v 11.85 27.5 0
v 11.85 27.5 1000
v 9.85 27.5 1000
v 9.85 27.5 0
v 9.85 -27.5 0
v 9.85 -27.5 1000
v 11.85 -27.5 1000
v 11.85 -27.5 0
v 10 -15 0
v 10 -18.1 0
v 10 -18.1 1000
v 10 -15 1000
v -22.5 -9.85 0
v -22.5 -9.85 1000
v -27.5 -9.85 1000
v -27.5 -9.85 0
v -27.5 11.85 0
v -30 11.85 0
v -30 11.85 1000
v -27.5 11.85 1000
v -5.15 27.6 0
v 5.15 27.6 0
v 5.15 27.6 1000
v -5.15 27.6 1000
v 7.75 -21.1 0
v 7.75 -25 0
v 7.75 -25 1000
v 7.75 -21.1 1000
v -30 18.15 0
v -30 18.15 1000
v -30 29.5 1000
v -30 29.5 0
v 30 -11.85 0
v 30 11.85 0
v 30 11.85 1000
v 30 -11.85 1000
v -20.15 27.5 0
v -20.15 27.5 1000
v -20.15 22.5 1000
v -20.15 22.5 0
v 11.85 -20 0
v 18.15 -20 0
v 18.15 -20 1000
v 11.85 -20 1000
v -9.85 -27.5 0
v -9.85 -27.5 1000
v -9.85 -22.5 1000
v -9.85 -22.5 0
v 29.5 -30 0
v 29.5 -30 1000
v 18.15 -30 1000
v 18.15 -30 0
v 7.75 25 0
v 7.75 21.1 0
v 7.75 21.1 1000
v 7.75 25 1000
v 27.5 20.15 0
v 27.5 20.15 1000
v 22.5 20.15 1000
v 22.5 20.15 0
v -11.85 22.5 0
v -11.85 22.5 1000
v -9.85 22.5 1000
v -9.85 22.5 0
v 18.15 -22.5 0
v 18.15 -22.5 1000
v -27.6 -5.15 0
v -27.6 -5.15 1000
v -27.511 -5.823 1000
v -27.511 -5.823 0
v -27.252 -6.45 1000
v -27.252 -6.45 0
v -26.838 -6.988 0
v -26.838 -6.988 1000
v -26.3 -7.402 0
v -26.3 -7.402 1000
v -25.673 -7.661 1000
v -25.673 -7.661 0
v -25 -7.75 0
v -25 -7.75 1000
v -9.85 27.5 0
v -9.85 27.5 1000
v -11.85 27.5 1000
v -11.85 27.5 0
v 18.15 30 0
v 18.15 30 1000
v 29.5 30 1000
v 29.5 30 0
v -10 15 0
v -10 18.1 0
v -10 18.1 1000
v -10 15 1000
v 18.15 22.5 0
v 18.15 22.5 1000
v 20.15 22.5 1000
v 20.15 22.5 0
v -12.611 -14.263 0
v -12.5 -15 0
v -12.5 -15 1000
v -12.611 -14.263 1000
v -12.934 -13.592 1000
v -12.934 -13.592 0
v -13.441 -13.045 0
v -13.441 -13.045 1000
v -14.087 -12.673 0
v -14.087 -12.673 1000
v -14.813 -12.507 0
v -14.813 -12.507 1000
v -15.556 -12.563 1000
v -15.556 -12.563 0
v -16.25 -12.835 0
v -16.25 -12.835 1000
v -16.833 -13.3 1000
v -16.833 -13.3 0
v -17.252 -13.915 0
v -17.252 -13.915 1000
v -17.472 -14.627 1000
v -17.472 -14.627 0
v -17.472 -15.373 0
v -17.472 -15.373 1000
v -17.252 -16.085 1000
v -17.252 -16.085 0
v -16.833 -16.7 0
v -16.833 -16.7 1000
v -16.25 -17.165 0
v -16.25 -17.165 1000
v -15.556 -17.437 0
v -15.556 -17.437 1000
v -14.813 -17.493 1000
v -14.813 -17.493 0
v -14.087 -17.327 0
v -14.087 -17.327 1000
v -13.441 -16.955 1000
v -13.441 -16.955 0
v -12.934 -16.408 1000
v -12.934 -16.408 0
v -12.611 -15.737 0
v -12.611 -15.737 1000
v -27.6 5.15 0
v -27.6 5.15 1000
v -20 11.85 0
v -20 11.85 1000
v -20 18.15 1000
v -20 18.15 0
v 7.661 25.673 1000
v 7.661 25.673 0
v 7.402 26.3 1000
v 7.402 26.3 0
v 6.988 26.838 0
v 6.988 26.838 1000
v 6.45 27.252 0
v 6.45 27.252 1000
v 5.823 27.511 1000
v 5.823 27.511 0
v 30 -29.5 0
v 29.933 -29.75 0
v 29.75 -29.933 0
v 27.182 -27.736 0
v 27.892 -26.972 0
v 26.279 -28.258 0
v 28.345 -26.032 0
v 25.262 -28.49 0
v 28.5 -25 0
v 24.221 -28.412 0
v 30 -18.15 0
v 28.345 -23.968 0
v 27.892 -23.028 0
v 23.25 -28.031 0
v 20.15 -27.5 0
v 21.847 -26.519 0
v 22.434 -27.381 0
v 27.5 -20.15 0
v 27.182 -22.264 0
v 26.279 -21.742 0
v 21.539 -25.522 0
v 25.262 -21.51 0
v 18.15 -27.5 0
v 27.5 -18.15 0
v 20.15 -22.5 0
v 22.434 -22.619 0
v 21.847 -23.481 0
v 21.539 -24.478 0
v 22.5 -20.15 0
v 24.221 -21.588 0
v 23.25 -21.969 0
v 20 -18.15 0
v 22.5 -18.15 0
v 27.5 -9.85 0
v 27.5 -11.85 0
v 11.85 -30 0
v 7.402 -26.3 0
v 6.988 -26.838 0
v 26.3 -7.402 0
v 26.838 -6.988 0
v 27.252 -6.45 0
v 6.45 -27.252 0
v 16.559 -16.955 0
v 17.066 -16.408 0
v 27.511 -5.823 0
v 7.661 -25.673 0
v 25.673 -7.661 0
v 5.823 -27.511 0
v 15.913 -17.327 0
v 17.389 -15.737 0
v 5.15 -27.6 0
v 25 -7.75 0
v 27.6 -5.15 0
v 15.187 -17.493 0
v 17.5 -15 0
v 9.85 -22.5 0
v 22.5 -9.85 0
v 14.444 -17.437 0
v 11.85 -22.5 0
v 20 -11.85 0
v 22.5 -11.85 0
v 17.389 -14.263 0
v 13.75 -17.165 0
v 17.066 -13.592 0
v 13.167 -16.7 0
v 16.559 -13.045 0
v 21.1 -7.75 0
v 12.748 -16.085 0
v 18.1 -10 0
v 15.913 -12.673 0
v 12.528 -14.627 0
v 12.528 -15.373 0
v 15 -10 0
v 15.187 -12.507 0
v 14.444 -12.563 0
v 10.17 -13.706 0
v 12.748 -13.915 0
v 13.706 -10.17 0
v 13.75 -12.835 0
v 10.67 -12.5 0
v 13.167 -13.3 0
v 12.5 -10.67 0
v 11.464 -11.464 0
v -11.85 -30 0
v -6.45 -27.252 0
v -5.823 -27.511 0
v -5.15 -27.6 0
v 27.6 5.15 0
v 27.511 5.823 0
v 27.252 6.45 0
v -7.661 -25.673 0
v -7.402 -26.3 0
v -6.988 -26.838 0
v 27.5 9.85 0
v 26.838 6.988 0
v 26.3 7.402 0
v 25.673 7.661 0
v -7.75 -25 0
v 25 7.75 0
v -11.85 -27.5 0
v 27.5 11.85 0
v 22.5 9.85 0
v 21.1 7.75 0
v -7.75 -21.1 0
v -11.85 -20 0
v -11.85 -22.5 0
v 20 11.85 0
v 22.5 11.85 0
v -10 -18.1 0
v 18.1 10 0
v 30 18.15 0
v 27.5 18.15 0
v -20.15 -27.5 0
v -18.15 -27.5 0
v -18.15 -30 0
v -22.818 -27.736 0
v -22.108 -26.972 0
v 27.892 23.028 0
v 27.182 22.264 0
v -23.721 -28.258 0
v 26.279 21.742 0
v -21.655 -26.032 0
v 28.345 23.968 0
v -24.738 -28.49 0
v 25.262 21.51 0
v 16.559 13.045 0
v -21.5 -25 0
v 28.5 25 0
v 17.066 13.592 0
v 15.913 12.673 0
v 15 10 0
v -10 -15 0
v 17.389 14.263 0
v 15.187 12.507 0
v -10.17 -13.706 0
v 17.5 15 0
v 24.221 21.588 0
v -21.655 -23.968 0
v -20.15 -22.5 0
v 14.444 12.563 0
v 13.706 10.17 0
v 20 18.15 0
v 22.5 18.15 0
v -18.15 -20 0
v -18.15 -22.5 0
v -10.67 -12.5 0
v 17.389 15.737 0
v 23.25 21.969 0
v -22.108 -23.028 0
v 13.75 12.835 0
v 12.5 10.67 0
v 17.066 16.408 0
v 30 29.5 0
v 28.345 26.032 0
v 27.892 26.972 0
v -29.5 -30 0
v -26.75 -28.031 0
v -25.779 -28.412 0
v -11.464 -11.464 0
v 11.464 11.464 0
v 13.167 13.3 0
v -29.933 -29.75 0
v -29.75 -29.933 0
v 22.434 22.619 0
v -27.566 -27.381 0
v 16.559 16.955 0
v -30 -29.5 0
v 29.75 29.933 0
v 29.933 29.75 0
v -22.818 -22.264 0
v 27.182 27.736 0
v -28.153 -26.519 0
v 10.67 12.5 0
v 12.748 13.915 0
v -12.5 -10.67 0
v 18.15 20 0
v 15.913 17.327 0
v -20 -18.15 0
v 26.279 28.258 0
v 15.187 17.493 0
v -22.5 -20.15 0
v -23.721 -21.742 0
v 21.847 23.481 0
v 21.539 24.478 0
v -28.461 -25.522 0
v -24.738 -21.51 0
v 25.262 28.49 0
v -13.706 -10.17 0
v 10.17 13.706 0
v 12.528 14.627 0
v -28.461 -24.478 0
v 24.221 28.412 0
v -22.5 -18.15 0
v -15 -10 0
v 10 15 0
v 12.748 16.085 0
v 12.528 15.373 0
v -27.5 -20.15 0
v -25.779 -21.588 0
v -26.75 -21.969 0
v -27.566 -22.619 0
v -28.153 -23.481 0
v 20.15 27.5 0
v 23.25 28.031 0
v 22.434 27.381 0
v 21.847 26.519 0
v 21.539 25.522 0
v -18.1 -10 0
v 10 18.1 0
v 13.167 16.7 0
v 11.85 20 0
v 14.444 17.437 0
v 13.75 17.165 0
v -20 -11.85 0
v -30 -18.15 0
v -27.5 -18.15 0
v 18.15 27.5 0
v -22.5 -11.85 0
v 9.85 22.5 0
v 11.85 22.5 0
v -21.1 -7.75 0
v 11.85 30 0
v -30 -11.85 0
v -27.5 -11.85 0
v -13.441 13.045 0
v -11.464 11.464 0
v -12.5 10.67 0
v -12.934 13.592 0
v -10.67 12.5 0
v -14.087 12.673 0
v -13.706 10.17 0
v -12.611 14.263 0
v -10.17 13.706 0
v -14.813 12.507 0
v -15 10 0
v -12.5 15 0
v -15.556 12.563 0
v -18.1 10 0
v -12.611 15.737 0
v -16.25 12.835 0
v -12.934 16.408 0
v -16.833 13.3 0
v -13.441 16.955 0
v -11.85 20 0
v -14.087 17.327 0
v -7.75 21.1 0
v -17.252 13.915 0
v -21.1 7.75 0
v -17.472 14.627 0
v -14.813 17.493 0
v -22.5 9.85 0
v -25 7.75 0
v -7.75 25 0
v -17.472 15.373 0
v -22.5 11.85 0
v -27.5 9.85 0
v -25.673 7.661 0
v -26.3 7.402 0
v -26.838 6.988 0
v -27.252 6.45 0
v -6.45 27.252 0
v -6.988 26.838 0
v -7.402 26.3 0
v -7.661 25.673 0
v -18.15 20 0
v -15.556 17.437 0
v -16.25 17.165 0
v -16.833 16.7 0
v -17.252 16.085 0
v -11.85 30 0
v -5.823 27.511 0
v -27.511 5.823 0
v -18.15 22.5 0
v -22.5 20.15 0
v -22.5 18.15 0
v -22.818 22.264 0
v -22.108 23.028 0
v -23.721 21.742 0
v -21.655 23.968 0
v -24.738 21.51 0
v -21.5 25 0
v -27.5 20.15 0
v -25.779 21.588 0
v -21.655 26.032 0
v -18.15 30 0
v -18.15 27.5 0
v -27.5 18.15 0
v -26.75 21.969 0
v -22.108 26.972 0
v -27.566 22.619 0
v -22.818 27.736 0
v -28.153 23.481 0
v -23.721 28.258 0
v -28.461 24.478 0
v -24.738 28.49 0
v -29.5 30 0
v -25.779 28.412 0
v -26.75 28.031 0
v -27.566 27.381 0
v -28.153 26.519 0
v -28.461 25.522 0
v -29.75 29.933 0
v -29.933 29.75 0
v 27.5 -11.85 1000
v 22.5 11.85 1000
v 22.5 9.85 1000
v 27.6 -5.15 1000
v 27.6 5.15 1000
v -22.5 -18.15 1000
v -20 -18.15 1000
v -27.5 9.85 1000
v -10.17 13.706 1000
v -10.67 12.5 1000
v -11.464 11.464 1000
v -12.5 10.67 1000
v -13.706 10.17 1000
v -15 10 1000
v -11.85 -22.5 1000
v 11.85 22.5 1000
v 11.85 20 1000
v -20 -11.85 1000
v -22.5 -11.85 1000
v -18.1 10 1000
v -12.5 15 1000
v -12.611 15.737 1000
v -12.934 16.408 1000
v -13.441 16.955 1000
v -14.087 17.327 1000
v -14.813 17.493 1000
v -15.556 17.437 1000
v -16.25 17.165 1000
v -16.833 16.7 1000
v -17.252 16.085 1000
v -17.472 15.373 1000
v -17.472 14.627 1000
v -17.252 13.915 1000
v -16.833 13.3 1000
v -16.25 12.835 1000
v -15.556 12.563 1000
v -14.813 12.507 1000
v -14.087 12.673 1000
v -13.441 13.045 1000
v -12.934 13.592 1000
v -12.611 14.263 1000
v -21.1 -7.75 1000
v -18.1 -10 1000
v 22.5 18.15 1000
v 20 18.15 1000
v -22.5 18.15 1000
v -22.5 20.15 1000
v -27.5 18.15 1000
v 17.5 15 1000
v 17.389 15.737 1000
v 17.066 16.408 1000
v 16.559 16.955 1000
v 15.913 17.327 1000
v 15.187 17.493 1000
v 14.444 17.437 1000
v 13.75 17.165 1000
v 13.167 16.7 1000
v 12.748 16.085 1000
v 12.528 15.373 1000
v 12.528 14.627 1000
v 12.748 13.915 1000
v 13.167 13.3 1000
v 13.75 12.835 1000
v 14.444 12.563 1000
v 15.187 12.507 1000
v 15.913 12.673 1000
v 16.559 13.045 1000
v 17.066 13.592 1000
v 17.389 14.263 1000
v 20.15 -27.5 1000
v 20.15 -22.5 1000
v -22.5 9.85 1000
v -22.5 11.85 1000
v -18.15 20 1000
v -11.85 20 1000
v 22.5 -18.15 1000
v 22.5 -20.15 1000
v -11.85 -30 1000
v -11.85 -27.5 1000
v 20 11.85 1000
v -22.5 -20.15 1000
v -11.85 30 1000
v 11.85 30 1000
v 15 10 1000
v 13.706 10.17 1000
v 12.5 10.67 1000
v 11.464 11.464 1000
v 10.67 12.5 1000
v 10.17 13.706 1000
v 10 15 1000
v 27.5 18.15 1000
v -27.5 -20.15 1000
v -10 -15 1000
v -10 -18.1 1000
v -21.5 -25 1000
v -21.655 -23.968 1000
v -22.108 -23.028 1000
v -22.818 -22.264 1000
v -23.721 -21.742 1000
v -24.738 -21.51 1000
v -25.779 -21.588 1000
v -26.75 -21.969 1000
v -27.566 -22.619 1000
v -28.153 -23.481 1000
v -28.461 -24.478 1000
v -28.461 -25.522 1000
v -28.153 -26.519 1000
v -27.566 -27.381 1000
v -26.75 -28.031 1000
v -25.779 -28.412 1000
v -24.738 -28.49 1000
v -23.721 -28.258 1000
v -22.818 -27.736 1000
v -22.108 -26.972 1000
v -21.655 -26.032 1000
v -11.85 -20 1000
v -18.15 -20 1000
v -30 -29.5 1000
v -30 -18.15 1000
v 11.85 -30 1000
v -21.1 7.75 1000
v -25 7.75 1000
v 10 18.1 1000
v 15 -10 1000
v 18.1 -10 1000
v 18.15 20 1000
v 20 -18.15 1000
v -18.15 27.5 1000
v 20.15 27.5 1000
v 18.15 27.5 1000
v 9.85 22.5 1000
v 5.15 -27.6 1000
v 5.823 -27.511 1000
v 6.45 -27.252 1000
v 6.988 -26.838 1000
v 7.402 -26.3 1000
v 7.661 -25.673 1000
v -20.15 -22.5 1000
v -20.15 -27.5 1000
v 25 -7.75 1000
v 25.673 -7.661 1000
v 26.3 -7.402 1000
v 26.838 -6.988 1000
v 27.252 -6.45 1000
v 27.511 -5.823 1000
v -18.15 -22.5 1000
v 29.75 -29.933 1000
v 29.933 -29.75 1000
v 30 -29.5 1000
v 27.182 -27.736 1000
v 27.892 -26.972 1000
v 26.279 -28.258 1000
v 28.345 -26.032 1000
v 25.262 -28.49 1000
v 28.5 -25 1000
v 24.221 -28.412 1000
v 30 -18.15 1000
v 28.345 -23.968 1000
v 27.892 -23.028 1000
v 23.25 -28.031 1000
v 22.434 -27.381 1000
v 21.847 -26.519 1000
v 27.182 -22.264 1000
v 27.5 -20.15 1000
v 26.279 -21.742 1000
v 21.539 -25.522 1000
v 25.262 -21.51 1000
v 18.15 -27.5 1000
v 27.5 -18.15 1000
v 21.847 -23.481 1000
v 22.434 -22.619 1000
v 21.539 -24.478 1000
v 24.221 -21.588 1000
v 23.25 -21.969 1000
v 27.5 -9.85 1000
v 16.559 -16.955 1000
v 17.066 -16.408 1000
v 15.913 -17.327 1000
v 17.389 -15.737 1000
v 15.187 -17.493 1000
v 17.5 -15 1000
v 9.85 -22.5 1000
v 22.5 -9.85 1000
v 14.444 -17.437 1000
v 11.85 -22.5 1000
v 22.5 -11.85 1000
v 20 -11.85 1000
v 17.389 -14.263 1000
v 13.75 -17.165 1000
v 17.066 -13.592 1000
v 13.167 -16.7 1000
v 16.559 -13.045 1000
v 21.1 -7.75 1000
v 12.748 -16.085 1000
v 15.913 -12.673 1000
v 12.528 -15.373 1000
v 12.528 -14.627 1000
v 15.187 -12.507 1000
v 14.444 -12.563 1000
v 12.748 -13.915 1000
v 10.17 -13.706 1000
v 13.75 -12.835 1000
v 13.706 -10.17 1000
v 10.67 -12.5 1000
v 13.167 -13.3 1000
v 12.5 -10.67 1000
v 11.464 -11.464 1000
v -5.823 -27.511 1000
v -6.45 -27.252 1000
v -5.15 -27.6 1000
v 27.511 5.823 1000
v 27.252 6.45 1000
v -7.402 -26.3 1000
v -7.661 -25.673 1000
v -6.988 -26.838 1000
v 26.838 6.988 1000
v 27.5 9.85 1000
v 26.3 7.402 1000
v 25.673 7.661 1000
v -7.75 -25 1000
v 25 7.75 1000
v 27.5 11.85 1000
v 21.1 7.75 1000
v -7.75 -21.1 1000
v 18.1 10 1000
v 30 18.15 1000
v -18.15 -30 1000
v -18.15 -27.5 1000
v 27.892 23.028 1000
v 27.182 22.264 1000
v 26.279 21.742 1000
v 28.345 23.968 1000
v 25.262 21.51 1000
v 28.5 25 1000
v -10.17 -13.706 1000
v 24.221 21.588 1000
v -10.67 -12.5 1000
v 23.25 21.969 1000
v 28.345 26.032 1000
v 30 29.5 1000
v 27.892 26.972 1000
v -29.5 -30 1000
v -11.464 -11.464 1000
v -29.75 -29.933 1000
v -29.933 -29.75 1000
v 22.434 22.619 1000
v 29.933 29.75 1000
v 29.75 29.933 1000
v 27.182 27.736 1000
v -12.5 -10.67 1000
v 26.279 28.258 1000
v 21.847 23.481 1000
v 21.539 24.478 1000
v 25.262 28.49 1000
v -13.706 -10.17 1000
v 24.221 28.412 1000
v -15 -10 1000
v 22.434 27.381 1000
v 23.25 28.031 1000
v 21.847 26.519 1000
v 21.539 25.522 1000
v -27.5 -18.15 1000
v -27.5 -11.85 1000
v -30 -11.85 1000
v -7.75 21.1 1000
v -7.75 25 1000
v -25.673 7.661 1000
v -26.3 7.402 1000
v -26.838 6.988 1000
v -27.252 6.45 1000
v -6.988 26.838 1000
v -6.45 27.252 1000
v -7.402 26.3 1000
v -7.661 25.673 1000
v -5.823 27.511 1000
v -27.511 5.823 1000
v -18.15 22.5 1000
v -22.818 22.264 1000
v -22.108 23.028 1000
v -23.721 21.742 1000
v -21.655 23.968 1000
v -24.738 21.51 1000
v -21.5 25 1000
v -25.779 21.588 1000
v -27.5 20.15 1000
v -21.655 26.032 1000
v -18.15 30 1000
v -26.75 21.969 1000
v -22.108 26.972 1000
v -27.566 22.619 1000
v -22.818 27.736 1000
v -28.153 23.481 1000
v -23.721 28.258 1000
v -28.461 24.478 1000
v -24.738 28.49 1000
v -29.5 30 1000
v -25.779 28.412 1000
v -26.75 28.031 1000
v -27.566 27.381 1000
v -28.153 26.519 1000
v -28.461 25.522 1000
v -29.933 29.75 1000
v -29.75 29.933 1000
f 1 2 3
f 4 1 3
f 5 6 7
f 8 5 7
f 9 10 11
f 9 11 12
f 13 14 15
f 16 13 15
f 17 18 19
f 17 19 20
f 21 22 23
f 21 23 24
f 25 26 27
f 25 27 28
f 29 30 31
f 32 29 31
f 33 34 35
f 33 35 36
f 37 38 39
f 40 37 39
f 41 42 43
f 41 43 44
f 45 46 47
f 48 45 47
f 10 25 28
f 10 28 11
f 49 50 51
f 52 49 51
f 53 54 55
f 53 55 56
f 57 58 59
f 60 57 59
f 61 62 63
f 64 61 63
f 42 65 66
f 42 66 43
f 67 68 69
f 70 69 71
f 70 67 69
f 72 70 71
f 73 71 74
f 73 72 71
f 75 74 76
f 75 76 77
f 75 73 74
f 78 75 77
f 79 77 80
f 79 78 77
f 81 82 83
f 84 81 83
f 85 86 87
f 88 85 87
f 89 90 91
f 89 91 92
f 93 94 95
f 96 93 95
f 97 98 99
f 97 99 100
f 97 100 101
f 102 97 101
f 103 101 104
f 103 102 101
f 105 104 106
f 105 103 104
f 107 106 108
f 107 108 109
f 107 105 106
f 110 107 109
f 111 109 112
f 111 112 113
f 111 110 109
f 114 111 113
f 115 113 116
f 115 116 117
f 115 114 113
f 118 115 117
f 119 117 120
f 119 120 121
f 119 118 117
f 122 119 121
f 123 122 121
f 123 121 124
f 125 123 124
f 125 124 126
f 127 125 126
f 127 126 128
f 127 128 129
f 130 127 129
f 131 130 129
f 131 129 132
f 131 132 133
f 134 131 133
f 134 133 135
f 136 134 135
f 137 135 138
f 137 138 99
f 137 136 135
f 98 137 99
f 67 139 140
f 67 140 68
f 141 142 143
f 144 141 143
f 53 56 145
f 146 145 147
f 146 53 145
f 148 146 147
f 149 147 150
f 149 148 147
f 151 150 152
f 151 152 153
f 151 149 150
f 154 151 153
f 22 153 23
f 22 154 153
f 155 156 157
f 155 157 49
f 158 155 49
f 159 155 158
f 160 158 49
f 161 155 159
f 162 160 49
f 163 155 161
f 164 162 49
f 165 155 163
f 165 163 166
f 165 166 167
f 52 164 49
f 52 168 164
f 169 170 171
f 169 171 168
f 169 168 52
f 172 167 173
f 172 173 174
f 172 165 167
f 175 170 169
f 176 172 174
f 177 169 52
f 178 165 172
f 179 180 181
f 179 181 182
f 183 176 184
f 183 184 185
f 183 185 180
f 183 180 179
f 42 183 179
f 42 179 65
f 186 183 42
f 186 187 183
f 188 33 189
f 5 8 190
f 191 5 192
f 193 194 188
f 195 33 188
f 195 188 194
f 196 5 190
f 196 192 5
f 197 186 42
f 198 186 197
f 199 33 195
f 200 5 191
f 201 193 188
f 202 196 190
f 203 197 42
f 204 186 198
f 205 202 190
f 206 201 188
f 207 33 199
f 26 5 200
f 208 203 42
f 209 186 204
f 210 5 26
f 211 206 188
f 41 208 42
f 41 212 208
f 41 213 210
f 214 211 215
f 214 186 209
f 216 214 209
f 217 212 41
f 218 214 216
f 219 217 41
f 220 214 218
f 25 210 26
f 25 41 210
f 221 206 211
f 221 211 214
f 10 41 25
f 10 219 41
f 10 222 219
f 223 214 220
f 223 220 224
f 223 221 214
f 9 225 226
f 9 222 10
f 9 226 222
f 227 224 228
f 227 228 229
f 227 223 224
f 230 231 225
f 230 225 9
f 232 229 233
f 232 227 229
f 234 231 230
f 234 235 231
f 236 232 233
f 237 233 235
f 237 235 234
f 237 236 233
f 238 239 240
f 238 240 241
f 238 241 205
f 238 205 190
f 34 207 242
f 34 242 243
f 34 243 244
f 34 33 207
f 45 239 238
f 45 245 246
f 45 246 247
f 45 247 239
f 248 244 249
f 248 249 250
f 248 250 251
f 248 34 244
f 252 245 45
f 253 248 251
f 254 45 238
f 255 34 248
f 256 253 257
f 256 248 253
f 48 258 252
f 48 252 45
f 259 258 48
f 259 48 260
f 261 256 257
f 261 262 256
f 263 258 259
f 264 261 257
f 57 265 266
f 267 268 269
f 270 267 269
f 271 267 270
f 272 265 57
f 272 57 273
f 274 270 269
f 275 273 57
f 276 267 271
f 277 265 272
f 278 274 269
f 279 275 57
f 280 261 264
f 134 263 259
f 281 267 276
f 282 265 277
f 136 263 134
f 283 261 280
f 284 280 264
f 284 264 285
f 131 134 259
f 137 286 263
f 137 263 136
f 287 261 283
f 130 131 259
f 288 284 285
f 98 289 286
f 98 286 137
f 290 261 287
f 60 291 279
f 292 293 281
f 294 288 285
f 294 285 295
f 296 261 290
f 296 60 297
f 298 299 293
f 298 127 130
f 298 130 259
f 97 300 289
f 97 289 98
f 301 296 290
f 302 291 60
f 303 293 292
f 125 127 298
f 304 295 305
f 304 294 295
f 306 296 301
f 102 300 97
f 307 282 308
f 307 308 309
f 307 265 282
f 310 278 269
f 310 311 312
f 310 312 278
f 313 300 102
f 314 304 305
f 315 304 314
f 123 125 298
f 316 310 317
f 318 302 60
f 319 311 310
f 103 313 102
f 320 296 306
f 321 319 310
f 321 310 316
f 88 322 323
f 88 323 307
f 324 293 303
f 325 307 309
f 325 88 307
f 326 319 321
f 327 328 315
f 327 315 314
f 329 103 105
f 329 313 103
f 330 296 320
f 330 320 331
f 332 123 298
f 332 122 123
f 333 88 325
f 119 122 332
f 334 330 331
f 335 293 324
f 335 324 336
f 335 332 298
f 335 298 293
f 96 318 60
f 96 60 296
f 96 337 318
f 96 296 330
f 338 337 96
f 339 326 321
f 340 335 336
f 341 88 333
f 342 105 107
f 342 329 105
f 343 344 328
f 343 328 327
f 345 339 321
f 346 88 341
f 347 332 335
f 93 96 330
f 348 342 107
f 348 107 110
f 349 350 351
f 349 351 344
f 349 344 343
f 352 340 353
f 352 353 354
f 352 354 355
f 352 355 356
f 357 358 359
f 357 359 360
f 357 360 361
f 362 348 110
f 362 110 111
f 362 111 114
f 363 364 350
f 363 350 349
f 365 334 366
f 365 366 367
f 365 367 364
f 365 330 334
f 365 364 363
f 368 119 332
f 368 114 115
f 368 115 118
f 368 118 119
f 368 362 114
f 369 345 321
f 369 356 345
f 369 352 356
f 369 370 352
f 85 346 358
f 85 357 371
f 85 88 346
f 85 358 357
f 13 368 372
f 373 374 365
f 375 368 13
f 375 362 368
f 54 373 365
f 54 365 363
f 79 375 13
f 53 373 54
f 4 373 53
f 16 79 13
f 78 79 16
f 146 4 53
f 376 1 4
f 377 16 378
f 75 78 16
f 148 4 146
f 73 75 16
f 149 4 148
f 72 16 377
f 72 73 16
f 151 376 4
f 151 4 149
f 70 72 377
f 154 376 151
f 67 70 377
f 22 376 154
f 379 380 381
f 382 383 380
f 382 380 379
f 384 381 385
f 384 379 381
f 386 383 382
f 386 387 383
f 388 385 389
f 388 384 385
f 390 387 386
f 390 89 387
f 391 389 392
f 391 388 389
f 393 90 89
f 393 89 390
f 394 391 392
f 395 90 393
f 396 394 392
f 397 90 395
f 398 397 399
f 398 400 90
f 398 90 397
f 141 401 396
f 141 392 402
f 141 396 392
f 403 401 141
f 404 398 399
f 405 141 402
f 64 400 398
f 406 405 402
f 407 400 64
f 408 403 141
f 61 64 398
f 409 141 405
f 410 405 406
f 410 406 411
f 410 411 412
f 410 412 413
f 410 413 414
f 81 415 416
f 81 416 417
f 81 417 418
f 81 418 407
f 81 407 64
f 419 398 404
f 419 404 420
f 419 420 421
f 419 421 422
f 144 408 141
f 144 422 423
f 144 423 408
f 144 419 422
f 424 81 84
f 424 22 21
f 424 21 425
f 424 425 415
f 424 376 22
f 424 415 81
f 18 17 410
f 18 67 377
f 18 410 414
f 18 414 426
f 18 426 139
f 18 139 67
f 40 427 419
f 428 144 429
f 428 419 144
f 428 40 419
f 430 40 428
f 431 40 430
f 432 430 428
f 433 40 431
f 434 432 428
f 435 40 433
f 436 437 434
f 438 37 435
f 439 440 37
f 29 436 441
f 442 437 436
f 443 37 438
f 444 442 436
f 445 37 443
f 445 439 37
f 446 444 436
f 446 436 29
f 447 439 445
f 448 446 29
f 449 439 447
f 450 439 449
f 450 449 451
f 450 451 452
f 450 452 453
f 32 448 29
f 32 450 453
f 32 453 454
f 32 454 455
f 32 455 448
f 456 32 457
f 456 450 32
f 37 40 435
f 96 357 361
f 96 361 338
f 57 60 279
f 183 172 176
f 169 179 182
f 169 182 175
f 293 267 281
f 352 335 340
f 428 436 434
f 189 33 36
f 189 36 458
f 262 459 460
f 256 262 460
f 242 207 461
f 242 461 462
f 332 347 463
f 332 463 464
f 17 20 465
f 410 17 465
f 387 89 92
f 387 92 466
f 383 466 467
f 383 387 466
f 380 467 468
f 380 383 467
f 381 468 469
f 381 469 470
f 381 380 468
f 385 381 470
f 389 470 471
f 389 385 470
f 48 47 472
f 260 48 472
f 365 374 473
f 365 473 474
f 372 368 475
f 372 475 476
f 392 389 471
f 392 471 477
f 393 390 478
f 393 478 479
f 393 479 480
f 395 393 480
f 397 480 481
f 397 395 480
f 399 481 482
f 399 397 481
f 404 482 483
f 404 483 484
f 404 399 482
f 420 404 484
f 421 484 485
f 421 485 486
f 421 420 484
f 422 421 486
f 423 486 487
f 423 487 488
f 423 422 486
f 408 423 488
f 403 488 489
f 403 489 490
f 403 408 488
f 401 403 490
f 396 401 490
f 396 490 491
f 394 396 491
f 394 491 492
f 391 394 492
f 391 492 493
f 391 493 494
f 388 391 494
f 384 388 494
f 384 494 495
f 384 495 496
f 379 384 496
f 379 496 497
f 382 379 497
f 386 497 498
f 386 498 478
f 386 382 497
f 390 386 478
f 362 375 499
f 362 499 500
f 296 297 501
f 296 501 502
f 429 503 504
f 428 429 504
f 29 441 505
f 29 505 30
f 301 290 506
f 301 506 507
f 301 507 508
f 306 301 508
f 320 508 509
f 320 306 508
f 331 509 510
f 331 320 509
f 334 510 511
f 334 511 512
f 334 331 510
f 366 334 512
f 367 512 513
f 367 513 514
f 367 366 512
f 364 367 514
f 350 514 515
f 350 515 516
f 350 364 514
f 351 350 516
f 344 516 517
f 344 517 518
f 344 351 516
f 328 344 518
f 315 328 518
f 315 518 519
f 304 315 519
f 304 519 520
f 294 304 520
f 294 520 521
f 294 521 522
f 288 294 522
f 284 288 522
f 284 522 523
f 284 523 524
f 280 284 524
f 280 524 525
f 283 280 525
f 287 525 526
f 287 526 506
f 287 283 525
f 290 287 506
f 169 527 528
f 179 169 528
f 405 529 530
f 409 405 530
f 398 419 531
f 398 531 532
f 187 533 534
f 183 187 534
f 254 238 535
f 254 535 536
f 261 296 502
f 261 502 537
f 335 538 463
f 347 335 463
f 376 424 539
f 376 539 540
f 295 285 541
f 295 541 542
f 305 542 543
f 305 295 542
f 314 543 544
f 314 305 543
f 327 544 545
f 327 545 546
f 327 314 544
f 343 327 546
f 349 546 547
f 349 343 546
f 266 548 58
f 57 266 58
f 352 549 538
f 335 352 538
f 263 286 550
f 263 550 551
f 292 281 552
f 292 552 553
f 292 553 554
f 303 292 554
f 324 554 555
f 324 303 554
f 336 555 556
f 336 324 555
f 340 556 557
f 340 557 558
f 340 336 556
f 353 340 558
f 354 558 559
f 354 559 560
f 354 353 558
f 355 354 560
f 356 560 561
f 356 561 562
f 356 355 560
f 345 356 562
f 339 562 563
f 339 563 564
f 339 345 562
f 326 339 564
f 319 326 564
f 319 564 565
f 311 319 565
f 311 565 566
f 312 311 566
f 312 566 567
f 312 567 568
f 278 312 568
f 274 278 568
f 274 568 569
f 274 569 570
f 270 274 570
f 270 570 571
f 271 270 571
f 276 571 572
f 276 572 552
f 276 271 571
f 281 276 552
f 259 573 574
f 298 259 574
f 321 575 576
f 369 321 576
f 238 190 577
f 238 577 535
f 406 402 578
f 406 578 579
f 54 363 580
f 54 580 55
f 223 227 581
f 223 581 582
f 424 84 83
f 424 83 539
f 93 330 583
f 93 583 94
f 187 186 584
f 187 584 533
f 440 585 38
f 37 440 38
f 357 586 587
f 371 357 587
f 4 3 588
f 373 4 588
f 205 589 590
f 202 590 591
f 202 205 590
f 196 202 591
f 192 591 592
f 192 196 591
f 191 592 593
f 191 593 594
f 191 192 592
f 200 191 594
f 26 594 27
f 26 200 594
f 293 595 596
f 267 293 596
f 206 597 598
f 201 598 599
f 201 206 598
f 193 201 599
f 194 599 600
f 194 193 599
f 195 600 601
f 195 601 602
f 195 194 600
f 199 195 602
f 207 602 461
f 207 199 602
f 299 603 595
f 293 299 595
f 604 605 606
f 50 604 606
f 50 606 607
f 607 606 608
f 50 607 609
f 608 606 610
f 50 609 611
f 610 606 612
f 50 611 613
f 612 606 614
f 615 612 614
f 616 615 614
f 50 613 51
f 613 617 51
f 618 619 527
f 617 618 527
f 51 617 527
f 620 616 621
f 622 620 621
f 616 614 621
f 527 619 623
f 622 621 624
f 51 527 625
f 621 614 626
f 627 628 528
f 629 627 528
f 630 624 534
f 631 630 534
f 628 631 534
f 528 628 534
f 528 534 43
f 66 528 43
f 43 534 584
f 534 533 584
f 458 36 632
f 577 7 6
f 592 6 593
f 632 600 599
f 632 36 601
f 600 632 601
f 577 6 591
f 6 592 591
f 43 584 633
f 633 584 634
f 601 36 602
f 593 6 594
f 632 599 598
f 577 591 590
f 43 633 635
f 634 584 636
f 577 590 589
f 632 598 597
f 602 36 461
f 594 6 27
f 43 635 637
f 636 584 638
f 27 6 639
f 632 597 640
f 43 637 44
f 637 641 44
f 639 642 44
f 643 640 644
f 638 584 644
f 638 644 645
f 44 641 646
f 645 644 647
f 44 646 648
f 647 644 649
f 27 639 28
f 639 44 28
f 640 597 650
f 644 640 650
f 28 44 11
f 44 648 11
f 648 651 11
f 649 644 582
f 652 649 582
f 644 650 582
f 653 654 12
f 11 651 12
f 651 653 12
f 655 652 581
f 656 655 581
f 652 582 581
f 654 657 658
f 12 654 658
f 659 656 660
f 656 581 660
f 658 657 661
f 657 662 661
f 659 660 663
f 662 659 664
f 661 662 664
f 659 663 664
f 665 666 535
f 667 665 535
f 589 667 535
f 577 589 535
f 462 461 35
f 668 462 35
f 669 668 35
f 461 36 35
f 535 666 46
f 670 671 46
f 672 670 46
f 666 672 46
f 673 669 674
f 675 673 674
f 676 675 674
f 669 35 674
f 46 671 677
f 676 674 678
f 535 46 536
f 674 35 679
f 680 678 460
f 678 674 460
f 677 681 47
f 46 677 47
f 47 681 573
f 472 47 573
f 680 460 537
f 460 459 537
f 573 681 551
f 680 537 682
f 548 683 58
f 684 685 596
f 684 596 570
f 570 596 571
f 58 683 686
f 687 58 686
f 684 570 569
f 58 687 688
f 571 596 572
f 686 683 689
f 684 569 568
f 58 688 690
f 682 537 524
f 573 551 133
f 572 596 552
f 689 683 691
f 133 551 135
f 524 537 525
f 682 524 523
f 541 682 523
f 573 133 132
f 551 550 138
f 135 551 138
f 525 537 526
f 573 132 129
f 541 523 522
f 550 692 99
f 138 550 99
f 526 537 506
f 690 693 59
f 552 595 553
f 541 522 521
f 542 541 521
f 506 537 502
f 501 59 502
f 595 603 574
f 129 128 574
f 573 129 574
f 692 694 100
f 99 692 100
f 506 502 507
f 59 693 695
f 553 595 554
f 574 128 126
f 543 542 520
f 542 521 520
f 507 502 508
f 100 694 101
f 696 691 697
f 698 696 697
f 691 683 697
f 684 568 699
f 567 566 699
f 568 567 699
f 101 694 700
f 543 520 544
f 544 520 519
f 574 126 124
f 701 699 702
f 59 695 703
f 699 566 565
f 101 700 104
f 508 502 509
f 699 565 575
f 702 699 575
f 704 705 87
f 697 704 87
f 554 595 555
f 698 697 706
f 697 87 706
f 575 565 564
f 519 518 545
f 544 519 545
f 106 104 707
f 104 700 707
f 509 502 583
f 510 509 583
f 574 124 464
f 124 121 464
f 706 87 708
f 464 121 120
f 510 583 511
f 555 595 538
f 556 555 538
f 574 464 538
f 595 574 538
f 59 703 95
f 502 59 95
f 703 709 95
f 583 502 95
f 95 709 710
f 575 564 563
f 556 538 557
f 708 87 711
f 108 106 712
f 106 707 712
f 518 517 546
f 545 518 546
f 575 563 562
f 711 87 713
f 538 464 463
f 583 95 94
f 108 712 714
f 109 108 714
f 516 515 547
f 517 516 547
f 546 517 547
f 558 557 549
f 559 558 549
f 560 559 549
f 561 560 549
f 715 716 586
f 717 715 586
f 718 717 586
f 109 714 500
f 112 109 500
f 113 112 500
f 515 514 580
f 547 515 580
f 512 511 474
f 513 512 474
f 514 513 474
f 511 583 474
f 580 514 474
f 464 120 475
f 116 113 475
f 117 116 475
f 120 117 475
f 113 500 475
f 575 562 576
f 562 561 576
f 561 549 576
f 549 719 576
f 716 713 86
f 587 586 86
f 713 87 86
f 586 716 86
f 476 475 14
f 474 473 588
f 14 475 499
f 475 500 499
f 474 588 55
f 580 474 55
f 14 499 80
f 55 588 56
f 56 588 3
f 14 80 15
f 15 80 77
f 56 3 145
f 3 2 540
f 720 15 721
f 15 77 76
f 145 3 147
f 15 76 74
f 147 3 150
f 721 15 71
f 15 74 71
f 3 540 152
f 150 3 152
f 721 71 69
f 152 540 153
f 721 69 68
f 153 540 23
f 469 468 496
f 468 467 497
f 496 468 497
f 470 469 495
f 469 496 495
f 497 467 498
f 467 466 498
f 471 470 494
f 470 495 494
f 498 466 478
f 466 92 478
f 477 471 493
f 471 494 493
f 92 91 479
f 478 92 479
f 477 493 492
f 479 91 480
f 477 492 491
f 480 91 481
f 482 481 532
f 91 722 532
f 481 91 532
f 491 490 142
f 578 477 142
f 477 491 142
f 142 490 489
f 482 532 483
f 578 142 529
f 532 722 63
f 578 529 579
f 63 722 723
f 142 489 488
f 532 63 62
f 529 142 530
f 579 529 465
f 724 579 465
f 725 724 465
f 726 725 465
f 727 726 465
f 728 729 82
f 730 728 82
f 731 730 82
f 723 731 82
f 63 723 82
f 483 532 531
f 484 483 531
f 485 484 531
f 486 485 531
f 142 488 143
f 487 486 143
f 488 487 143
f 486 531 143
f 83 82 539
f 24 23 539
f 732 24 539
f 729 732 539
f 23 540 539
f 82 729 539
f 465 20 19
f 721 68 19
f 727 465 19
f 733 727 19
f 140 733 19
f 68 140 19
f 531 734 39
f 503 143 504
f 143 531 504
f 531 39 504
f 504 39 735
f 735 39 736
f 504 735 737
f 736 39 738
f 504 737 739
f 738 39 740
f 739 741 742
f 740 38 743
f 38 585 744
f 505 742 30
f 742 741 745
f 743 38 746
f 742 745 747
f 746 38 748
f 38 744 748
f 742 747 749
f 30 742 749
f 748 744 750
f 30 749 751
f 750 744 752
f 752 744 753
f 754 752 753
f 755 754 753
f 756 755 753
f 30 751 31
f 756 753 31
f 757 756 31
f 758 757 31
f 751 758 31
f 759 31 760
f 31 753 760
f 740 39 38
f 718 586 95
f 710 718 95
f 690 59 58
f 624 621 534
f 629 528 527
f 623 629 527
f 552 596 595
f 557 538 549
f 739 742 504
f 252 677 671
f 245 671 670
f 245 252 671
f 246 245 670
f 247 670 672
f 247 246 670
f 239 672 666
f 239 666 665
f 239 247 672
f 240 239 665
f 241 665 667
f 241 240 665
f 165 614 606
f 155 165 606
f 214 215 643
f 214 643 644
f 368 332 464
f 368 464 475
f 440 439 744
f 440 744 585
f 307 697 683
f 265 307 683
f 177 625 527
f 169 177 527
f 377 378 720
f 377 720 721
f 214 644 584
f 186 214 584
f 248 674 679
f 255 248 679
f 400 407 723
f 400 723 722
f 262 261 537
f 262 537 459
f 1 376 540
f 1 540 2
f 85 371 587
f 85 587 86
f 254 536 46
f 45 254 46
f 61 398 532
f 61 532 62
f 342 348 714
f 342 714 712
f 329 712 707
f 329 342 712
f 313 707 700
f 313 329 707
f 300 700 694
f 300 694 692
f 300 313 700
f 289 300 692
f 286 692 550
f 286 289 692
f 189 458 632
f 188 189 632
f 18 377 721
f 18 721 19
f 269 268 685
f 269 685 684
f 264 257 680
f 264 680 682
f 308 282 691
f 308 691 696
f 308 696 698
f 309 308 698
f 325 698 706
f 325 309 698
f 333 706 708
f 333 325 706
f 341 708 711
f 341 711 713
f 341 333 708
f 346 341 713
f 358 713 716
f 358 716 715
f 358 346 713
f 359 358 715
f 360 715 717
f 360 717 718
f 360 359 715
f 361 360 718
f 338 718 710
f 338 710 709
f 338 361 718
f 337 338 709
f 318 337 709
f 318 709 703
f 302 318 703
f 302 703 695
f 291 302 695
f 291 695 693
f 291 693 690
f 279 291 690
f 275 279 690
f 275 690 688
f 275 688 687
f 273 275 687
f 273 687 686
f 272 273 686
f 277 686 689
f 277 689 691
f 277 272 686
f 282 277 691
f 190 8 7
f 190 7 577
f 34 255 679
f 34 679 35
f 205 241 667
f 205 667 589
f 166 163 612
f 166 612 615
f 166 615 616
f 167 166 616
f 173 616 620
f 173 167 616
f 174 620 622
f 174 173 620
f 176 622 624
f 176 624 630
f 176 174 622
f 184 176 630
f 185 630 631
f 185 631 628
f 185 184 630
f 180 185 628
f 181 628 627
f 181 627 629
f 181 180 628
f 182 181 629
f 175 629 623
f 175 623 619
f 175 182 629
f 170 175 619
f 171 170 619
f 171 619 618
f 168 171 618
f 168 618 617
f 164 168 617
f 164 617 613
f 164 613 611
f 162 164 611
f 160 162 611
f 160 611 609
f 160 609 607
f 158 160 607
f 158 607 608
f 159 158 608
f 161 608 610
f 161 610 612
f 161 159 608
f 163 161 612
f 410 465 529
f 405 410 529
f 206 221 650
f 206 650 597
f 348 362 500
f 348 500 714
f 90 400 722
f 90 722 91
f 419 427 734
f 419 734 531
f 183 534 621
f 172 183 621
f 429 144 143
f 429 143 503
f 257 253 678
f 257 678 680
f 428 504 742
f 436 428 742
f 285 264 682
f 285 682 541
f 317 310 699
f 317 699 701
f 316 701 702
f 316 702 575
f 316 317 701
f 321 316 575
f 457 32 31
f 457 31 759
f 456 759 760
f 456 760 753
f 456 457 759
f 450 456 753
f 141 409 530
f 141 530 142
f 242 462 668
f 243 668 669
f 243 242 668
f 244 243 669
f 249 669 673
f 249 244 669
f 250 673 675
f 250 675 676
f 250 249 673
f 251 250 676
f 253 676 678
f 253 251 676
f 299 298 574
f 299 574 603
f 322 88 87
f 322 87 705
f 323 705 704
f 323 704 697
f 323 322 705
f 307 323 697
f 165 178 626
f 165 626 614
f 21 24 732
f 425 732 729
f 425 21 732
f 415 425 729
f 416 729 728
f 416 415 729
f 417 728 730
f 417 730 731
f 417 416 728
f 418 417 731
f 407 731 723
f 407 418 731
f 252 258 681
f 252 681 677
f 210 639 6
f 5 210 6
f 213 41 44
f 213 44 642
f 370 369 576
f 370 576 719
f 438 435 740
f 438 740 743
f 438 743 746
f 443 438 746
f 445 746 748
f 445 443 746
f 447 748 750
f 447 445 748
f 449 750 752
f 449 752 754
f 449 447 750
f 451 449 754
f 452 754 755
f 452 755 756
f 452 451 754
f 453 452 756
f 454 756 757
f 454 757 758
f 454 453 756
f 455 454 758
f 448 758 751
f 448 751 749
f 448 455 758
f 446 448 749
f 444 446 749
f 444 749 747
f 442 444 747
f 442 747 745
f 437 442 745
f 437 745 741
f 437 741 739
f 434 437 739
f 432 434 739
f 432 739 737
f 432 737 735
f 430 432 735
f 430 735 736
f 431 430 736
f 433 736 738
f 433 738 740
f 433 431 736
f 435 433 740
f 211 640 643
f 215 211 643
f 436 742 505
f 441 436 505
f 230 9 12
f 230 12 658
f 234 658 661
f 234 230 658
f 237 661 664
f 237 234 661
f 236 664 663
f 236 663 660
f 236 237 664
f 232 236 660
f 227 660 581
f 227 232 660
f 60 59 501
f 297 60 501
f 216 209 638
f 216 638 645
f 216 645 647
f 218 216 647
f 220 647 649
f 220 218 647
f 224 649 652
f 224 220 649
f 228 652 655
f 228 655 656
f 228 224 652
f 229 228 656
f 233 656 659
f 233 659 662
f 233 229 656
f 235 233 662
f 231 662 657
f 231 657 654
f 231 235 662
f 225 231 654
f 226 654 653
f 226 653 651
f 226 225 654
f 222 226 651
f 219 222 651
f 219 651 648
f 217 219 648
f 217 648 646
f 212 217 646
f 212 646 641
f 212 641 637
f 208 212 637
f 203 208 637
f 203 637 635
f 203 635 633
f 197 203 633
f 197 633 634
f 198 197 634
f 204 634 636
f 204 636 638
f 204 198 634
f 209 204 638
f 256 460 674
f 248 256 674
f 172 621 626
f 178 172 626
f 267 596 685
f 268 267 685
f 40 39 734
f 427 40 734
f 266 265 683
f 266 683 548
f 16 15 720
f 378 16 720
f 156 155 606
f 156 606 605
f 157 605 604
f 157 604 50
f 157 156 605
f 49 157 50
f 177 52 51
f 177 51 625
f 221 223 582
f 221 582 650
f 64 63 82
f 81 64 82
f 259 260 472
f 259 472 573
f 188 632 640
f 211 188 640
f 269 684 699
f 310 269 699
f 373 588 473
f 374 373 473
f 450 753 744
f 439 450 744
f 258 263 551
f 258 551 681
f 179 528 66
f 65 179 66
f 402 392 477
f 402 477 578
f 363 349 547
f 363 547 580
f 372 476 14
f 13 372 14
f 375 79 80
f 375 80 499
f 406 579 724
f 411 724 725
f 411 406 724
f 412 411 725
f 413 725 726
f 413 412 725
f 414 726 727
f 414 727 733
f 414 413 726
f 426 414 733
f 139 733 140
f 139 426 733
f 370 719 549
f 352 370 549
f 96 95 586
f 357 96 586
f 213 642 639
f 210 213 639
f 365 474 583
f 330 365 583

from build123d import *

# Parameters (mm, degrees)
SKETCH_1_R      = 3.5
SKETCH_1_R_2    = 2.5
EXTRUDE_1_DEPTH = 1000


with BuildPart() as part:
    # Эскиз1 → Бобышка-Вытянуть1 (new body)
    with BuildSketch(Plane.XY):
        with BuildLine():
            Line((-30, 20.15), (-30, 29.5))
            ThreePointArc((-30, 29.5), (-29.853553391, 29.853553391), (-29.5, 30))
            Line((-29.5, 30), (-20.15, 30))
            Line((-20.15, 30), (-18.15, 30))
            Line((-18.15, 30), (-18.15, 27.5))
            Line((-18.15, 27.5), (-20.15, 27.5))
            Line((-20.15, 27.5), (-20.15, 22.5))
            Line((-20.15, 22.5), (-18.15, 22.5))
            Line((-18.15, 22.5), (-18.15, 20))
            Line((-18.15, 20), (-11.85, 20))
            Line((-11.85, 20), (-11.85, 22.5))
            Line((-11.85, 22.5), (-9.85, 22.5))
            Line((-9.85, 22.5), (-9.85, 27.5))
            Line((-9.85, 27.5), (-11.85, 27.5))
            Line((-11.85, 27.5), (-11.85, 30))
            Line((-11.85, 30), (-9.85, 30))
            Line((-9.85, 30), (0, 30))
            Line((0, 30), (9.85, 30))
            Line((9.85, 30), (11.85, 30))
            Line((11.85, 30), (11.85, 27.5))
            Line((11.85, 27.5), (9.85, 27.5))
            Line((9.85, 27.5), (9.85, 22.5))
            Line((9.85, 22.5), (11.85, 22.5))
            Line((11.85, 22.5), (11.85, 20))
            Line((11.85, 20), (18.15, 20))
            Line((18.15, 20), (18.15, 22.5))
            Line((18.15, 22.5), (20.15, 22.5))
            Line((20.15, 22.5), (20.15, 27.5))
            Line((20.15, 27.5), (18.15, 27.5))
            Line((18.15, 27.5), (18.15, 30))
            Line((18.15, 30), (20.15, 30))
            Line((20.15, 30), (29.5, 30))
            ThreePointArc((29.5, 30), (29.853553391, 29.853553391), (30, 29.5))
            Line((30, 29.5), (30, 20.15))
            Line((30, 20.15), (30, 18.15))
            Line((30, 18.15), (27.5, 18.15))
            Line((27.5, 18.15), (27.5, 20.15))
            Line((27.5, 20.15), (22.5, 20.15))
            Line((22.5, 20.15), (22.5, 18.15))
            Line((22.5, 18.15), (20, 18.15))
            Line((20, 18.15), (20, 11.85))
            Line((20, 11.85), (22.5, 11.85))
            Line((22.5, 11.85), (22.5, 9.85))
            Line((22.5, 9.85), (27.5, 9.85))
            Line((27.5, 9.85), (27.5, 11.85))
            Line((27.5, 11.85), (30, 11.85))
            Line((30, 11.85), (30, 9.85))
            Line((30, 9.85), (30, 0))
            Line((30, 0), (30, -9.85))
            Line((30, -9.85), (30, -11.85))
            Line((30, -11.85), (27.5, -11.85))
            Line((27.5, -11.85), (27.5, -9.85))
            Line((27.5, -9.85), (22.5, -9.85))
            Line((22.5, -9.85), (22.5, -11.85))
            Line((22.5, -11.85), (20, -11.85))
            Line((20, -11.85), (20, -18.15))
            Line((20, -18.15), (22.5, -18.15))
            Line((22.5, -18.15), (22.5, -20.15))
            Line((22.5, -20.15), (27.5, -20.15))
            Line((27.5, -20.15), (27.5, -18.15))
            Line((27.5, -18.15), (30, -18.15))
            Line((30, -18.15), (30, -20.15))
            Line((30, -20.15), (30, -29.5))
            ThreePointArc((30, -29.5), (29.853553391, -29.853553391), (29.5, -30))
            Line((29.5, -30), (20.15, -30))
            Line((20.15, -30), (18.15, -30))
            Line((18.15, -30), (18.15, -27.5))
            Line((18.15, -27.5), (20.15, -27.5))
            Line((20.15, -27.5), (20.15, -22.5))
            Line((20.15, -22.5), (18.15, -22.5))
            Line((18.15, -22.5), (18.15, -20))
            Line((18.15, -20), (11.85, -20))
            Line((11.85, -20), (11.85, -22.5))
            Line((11.85, -22.5), (9.85, -22.5))
            Line((9.85, -22.5), (9.85, -27.5))
            Line((9.85, -27.5), (11.85, -27.5))
            Line((11.85, -27.5), (11.85, -30))
            Line((11.85, -30), (9.85, -30))
            Line((9.85, -30), (0, -30))
            Line((0, -30), (-9.85, -30))
            Line((-9.85, -30), (-11.85, -30))
            Line((-11.85, -30), (-11.85, -27.5))
            Line((-11.85, -27.5), (-9.85, -27.5))
            Line((-9.85, -27.5), (-9.85, -22.5))
            Line((-9.85, -22.5), (-11.85, -22.5))
            Line((-11.85, -22.5), (-11.85, -20))
            Line((-11.85, -20), (-18.15, -20))
            Line((-18.15, -20), (-18.15, -22.5))
            Line((-18.15, -22.5), (-20.15, -22.5))
            Line((-20.15, -22.5), (-20.15, -27.5))
            Line((-20.15, -27.5), (-18.15, -27.5))
            Line((-18.15, -27.5), (-18.15, -30))
            Line((-18.15, -30), (-20.15, -30))
            Line((-20.15, -30), (-29.5, -30))
            ThreePointArc((-29.5, -30), (-29.853553391, -29.853553391), (-30, -29.5))
            Line((-30, -29.5), (-30, -20.15))
            Line((-30, -20.15), (-30, -18.15))
            Line((-30, -18.15), (-27.5, -18.15))
            Line((-27.5, -18.15), (-27.5, -20.15))
            Line((-27.5, -20.15), (-22.5, -20.15))
            Line((-22.5, -20.15), (-22.5, -18.15))
            Line((-22.5, -18.15), (-20, -18.15))
            Line((-20, -18.15), (-20, -11.85))
            Line((-20, -11.85), (-22.5, -11.85))
            Line((-22.5, -11.85), (-22.5, -9.85))
            Line((-22.5, -9.85), (-27.5, -9.85))
            Line((-27.5, -9.85), (-27.5, -11.85))
            Line((-27.5, -11.85), (-30, -11.85))
            Line((-30, -11.85), (-30, -9.85))
            Line((-30, -9.85), (-30, 0))
            Line((-30, 0), (-30, 9.85))
            Line((-30, 9.85), (-30, 11.85))
            Line((-30, 11.85), (-27.5, 11.85))
            Line((-27.5, 11.85), (-27.5, 9.85))
            Line((-27.5, 9.85), (-22.5, 9.85))
            Line((-22.5, 9.85), (-22.5, 11.85))
            Line((-22.5, 11.85), (-20, 11.85))
            Line((-20, 11.85), (-20, 18.15))
            Line((-20, 18.15), (-22.5, 18.15))
            Line((-22.5, 18.15), (-22.5, 20.15))
            Line((-22.5, 20.15), (-27.5, 20.15))
            Line((-27.5, 20.15), (-27.5, 18.15))
            Line((-27.5, 18.15), (-30, 18.15))
            Line((-30, 18.15), (-30, 20.15))
        make_face()
        with Locations((-25, 25)):
            Circle(SKETCH_1_R, mode=Mode.SUBTRACT)
        with Locations((-15, 15)):
            Circle(SKETCH_1_R_2, mode=Mode.SUBTRACT)
        with Locations((25, 25)):
            Circle(SKETCH_1_R, mode=Mode.SUBTRACT)
        with Locations((15, 15)):
            Circle(SKETCH_1_R_2, mode=Mode.SUBTRACT)
        with Locations((25, -25)):
            Circle(SKETCH_1_R, mode=Mode.SUBTRACT)
        with Locations((15, -15)):
            Circle(SKETCH_1_R_2, mode=Mode.SUBTRACT)
        with Locations((-25, -25)):
            Circle(SKETCH_1_R, mode=Mode.SUBTRACT)
        with Locations((-15, -15)):
            Circle(SKETCH_1_R_2, mode=Mode.SUBTRACT)
        with BuildLine():
            Line((0, 27.6), (-5.15, 27.6))
            ThreePointArc((-5.15, 27.6), (-6.988477631, 26.838477631), (-7.75, 25))
            Line((-7.75, 25), (-7.75, 21.1))
            Line((-7.75, 21.1), (-10, 18.1))
            Line((-10, 18.1), (-10, 15))
            ThreePointArc((-10, 15), (-11.464466094, 11.464466094), (-15, 10))
            Line((-15, 10), (-18.1, 10))
            Line((-18.1, 10), (-21.1, 7.75))
            Line((-21.1, 7.75), (-25, 7.75))
            ThreePointArc((-25, 7.75), (-26.838477631, 6.988477631), (-27.6, 5.15))
            Line((-27.6, 5.15), (-27.6, 0))
            Line((-27.6, 0), (-27.6, -5.15))
            ThreePointArc((-27.6, -5.15), (-26.838477631, -6.988477631), (-25, -7.75))
            Line((-25, -7.75), (-21.1, -7.75))
            Line((-21.1, -7.75), (-18.1, -10))
            Line((-18.1, -10), (-15, -10))
            ThreePointArc((-15, -10), (-11.464466094, -11.464466094), (-10, -15))
            Line((-10, -15), (-10, -18.1))
            Line((-10, -18.1), (-7.75, -21.1))
            Line((-7.75, -21.1), (-7.75, -25))
            ThreePointArc((-7.75, -25), (-6.988477631, -26.838477631), (-5.15, -27.6))
            Line((-5.15, -27.6), (0, -27.6))
            Line((0, -27.6), (5.15, -27.6))
            ThreePointArc((5.15, -27.6), (6.988477631, -26.838477631), (7.75, -25))
            Line((7.75, -25), (7.75, -21.1))
            Line((7.75, -21.1), (10, -18.1))
            Line((10, -18.1), (10, -15))
            ThreePointArc((10, -15), (11.464466094, -11.464466094), (15, -10))
            Line((15, -10), (18.1, -10))
            Line((18.1, -10), (21.1, -7.75))
            Line((21.1, -7.75), (25, -7.75))
            ThreePointArc((25, -7.75), (26.838477631, -6.988477631), (27.6, -5.15))
            Line((27.6, -5.15), (27.6, 0))
            Line((27.6, 0), (27.6, 5.15))
            ThreePointArc((27.6, 5.15), (26.838477631, 6.988477631), (25, 7.75))
            Line((25, 7.75), (21.1, 7.75))
            Line((21.1, 7.75), (18.1, 10))
            Line((18.1, 10), (15, 10))
            ThreePointArc((15, 10), (11.464466094, 11.464466094), (10, 15))
            Line((10, 15), (10, 18.1))
            Line((10, 18.1), (7.75, 21.1))
            Line((7.75, 21.1), (7.75, 25))
            ThreePointArc((7.75, 25), (6.988477631, 26.838477631), (5.15, 27.6))
            Line((5.15, 27.6), (0, 27.6))
        make_face(mode=Mode.SUBTRACT)
    extrude(amount=EXTRUDE_1_DEPTH)


solid = part.part
